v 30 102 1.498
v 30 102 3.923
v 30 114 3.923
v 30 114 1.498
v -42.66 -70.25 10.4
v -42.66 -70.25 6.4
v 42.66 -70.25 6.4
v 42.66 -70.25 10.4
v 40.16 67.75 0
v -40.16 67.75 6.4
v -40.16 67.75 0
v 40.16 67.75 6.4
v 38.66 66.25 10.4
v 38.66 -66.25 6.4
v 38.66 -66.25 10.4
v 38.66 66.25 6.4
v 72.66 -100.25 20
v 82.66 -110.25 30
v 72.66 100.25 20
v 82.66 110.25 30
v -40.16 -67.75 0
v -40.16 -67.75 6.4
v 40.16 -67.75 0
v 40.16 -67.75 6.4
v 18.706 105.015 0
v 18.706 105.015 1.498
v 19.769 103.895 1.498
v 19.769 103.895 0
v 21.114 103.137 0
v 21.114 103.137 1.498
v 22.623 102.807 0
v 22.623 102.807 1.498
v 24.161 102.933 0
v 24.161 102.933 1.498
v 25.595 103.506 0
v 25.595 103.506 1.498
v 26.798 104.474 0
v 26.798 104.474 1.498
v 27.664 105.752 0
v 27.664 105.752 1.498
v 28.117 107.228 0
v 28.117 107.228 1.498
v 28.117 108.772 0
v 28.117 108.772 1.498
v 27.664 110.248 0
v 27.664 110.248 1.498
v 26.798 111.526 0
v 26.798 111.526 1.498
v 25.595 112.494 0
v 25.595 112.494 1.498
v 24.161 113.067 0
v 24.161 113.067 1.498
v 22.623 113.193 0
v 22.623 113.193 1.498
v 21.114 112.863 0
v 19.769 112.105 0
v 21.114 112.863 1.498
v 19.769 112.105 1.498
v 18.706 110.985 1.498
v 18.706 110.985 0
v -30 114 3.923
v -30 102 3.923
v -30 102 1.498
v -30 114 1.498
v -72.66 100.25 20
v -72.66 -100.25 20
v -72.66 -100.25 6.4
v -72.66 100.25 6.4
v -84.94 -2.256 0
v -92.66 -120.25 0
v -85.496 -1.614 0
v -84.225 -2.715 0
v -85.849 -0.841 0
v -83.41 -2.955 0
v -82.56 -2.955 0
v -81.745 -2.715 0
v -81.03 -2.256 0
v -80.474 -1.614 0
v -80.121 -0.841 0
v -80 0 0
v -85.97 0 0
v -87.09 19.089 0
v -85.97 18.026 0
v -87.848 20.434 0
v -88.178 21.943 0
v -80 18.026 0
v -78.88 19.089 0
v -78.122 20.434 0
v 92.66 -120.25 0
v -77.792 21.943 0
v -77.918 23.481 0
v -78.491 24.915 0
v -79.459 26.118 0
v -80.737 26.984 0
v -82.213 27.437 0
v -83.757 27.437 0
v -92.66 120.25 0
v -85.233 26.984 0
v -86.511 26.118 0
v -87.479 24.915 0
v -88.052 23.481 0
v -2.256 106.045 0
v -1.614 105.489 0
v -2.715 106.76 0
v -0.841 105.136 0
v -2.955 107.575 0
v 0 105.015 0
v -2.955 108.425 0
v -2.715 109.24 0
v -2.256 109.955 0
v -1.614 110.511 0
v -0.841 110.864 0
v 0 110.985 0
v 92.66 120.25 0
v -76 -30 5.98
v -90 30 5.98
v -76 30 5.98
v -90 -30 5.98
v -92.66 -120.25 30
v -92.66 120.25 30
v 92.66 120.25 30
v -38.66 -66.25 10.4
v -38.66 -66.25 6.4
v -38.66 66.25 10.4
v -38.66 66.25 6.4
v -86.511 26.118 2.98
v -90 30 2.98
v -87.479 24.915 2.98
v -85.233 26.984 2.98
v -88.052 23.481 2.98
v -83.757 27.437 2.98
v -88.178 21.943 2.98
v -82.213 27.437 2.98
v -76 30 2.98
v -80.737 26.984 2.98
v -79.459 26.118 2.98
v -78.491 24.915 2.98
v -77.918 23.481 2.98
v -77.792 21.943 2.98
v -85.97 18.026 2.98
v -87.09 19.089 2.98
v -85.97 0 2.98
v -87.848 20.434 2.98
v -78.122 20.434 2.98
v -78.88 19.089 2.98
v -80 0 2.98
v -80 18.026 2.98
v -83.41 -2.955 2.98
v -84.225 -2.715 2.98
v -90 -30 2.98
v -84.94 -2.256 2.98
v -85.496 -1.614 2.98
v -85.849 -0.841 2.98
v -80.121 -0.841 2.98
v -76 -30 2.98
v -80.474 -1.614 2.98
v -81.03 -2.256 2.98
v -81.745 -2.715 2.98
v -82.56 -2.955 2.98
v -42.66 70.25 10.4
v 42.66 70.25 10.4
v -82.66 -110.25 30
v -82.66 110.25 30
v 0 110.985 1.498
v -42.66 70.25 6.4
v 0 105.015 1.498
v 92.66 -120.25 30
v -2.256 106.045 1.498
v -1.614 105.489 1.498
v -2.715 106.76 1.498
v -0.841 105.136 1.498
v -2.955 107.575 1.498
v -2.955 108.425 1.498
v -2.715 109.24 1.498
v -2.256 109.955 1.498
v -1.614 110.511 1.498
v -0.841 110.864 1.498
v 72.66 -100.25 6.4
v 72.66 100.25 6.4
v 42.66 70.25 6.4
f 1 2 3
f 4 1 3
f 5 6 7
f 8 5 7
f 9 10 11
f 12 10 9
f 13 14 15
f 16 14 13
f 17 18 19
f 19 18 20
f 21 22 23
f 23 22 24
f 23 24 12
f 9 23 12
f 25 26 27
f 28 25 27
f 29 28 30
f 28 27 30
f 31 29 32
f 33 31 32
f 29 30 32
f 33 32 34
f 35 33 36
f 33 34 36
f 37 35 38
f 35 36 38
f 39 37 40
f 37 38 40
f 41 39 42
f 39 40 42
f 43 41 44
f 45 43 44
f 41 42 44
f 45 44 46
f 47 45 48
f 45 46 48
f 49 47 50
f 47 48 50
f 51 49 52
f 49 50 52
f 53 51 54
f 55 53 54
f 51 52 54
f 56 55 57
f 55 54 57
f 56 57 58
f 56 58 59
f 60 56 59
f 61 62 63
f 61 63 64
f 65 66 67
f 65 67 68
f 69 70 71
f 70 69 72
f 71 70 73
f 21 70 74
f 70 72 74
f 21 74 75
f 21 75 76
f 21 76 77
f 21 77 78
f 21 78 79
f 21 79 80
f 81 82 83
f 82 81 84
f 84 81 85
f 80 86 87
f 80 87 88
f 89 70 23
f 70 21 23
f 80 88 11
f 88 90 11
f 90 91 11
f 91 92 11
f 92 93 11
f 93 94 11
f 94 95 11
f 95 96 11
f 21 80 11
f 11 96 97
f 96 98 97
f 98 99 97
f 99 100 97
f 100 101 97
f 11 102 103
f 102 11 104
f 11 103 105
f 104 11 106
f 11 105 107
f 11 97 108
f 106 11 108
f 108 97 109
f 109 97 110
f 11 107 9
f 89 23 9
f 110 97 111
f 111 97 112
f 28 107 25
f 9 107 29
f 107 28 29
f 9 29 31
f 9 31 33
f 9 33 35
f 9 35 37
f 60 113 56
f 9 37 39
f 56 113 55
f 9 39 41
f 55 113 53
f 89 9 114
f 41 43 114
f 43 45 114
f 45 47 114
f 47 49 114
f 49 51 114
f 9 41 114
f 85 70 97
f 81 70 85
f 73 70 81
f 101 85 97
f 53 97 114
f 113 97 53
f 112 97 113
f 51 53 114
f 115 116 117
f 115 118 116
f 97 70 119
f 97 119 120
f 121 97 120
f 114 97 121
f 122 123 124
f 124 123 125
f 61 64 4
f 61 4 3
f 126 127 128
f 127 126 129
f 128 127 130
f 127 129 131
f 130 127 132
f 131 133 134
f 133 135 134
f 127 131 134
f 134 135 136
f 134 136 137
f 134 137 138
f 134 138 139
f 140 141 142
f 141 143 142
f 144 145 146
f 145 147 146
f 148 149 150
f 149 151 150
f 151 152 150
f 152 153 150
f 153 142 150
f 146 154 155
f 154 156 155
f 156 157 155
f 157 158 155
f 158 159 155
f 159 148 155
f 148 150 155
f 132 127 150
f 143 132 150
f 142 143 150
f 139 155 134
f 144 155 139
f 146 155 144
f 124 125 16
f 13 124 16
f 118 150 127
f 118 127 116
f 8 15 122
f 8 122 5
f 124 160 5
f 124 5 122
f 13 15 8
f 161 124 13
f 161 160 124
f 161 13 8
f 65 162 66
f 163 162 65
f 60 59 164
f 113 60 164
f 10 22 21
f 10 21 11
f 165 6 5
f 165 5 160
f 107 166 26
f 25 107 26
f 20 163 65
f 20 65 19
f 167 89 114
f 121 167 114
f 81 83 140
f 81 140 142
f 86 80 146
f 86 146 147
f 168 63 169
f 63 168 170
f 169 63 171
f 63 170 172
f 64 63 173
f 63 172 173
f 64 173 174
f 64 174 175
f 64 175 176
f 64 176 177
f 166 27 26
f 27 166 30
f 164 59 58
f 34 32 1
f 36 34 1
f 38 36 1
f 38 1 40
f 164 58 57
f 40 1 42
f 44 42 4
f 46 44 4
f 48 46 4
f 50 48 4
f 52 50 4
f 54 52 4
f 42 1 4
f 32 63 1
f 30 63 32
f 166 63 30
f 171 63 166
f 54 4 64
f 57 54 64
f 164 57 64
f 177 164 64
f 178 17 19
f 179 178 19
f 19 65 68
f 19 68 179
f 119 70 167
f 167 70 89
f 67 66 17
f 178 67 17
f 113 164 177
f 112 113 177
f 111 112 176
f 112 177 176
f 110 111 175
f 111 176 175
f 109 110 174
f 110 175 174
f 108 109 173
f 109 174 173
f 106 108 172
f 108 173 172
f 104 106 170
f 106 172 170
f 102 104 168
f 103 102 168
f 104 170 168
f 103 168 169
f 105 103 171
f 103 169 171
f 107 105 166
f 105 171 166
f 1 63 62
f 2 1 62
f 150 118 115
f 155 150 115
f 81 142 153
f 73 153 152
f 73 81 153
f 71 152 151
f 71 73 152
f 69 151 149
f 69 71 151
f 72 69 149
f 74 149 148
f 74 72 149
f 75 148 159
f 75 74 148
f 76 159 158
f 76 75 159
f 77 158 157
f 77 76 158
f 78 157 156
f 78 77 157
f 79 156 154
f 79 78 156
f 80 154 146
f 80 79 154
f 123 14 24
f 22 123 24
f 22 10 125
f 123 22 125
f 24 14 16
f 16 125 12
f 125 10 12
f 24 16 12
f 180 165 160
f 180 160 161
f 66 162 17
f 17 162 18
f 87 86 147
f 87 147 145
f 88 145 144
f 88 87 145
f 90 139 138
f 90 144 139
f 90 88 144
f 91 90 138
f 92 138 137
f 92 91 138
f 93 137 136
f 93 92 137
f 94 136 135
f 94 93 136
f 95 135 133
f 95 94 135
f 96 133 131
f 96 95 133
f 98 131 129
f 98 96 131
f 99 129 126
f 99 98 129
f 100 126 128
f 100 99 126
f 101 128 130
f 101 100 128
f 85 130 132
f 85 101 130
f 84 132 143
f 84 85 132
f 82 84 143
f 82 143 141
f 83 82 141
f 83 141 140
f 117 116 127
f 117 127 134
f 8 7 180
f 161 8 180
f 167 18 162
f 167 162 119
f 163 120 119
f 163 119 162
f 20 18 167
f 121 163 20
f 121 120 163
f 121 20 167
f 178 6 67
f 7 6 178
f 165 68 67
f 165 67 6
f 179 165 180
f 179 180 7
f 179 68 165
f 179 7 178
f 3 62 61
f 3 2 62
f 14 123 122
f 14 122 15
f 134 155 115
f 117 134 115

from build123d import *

# Parameters (mm, degrees)
SKETCH_W             = 185.32
SKETCH_H             = 240.5
PAD_DEPTH            = 30
SKETCH003_W          = 145.32
SKETCH003_H          = 200.5
POCKET_DEPTH         = 23.6
SKETCH004_W          = 80.32
SKETCH004_H          = 135.5
POCKET001_DEPTH      = 6.4
POCKET002_DEPTH      = 3
SKETCH006_W          = 14
SKETCH006_H          = 3
POCKET003_DEPTH      = 30
POCKET004_DEPTH      = 1.5
SKETCH008_W          = 12
SKETCH008_H          = 2.4244
POCKET005_DEPTH      = 30
SKETCH009_W          = 85.32
SKETCH009_H          = 140.5
PAD001_DEPTH         = 4
SKETCH010_W          = 77.32
SKETCH010_H          = 132.5
POCKET006_DEPTH      = 0.001
POCKET006_DEPTH_BACK = -30.001
CHAMFER_SIZE         = 10


with BuildPart() as part:
    # Sketch → Pad (new body)
    with BuildSketch(Plane.XY):
        Rectangle(SKETCH_W, SKETCH_H)
    extrude(amount=PAD_DEPTH)

    # Sketch003 → Pocket (cut)
    with BuildSketch(Plane.XY.offset(30)):
        Rectangle(SKETCH003_W, SKETCH003_H)
    extrude(amount=-POCKET_DEPTH, mode=Mode.SUBTRACT)

    # Sketch004 → Pocket001 (cut)
    with BuildSketch(Plane.XY.offset(6.4)):
        Rectangle(SKETCH004_W, SKETCH004_H)
    extrude(amount=-POCKET001_DEPTH, mode=Mode.SUBTRACT)

    # Sketch005 → Pocket002 (cut)
    with BuildSketch(Plane.XY):
        with BuildLine():
            ThreePointArc((-85.97, 0), (-82.985, -2.985), (-80, 0))
            Line((-80, 0), (-80, 18.025988))
            ThreePointArc((-80, 18.025988), (-82.985, 27.495), (-85.97, 18.025988))
            Line((-85.97, 18.025988), (-85.97, 0))
        make_face()
    extrude(amount=POCKET002_DEPTH, mode=Mode.SUBTRACT)

    # Sketch006 → Pocket003 (cut, symmetric)
    with BuildSketch(Plane.XZ):
        with Locations((-83, 4.48)):
            Rectangle(SKETCH006_W, SKETCH006_H)
    extrude(amount=POCKET003_DEPTH, both=True, mode=Mode.SUBTRACT)

    # Sketch007 → Pocket004 (cut, symmetric)
    with BuildSketch(Plane.XY):
        with BuildLine():
            ThreePointArc((0, 110.985), (-2.985, 108), (0, 105.015))
            Line((0, 105.015), (18.705988, 105.015))
            ThreePointArc((18.705988, 105.015), (28.175, 108), (18.705988, 110.985))
            Line((18.705988, 110.985), (0, 110.985))
        make_face()
    extrude(amount=POCKET004_DEPTH, both=True, mode=Mode.SUBTRACT)

    # Sketch008 → Pocket005 (cut, symmetric)
    with BuildSketch(Plane.YZ):
        with Locations((108, 2.7105)):
            Rectangle(SKETCH008_W, SKETCH008_H)
    extrude(amount=POCKET005_DEPTH, both=True, mode=Mode.SUBTRACT)

    # Sketch009 → Pad001 (join)
    with BuildSketch(Plane.XY.offset(6.4)):
        Rectangle(SKETCH009_W, SKETCH009_H)
    extrude(amount=PAD001_DEPTH)

    # Sketch010 → Pocket006 (cut, two sides)
    with BuildSketch(Plane.XY) as pocket006_sk:
        Rectangle(SKETCH010_W, SKETCH010_H)
    extrude(amount=-POCKET006_DEPTH, mode=Mode.SUBTRACT)
    extrude(pocket006_sk.sketch, amount=-POCKET006_DEPTH_BACK, mode=Mode.SUBTRACT)

    # Chamfer
    chamfer_edges = [part.edges().sort_by_distance(p)[0] for p in [
        (-72.66, 0, 30),
        (0, 100.25, 30),
        (72.66, 0, 30),
        (0, -100.25, 30),
    ]]
    chamfer(chamfer_edges, length=CHAMFER_SIZE)


solid = part.part
